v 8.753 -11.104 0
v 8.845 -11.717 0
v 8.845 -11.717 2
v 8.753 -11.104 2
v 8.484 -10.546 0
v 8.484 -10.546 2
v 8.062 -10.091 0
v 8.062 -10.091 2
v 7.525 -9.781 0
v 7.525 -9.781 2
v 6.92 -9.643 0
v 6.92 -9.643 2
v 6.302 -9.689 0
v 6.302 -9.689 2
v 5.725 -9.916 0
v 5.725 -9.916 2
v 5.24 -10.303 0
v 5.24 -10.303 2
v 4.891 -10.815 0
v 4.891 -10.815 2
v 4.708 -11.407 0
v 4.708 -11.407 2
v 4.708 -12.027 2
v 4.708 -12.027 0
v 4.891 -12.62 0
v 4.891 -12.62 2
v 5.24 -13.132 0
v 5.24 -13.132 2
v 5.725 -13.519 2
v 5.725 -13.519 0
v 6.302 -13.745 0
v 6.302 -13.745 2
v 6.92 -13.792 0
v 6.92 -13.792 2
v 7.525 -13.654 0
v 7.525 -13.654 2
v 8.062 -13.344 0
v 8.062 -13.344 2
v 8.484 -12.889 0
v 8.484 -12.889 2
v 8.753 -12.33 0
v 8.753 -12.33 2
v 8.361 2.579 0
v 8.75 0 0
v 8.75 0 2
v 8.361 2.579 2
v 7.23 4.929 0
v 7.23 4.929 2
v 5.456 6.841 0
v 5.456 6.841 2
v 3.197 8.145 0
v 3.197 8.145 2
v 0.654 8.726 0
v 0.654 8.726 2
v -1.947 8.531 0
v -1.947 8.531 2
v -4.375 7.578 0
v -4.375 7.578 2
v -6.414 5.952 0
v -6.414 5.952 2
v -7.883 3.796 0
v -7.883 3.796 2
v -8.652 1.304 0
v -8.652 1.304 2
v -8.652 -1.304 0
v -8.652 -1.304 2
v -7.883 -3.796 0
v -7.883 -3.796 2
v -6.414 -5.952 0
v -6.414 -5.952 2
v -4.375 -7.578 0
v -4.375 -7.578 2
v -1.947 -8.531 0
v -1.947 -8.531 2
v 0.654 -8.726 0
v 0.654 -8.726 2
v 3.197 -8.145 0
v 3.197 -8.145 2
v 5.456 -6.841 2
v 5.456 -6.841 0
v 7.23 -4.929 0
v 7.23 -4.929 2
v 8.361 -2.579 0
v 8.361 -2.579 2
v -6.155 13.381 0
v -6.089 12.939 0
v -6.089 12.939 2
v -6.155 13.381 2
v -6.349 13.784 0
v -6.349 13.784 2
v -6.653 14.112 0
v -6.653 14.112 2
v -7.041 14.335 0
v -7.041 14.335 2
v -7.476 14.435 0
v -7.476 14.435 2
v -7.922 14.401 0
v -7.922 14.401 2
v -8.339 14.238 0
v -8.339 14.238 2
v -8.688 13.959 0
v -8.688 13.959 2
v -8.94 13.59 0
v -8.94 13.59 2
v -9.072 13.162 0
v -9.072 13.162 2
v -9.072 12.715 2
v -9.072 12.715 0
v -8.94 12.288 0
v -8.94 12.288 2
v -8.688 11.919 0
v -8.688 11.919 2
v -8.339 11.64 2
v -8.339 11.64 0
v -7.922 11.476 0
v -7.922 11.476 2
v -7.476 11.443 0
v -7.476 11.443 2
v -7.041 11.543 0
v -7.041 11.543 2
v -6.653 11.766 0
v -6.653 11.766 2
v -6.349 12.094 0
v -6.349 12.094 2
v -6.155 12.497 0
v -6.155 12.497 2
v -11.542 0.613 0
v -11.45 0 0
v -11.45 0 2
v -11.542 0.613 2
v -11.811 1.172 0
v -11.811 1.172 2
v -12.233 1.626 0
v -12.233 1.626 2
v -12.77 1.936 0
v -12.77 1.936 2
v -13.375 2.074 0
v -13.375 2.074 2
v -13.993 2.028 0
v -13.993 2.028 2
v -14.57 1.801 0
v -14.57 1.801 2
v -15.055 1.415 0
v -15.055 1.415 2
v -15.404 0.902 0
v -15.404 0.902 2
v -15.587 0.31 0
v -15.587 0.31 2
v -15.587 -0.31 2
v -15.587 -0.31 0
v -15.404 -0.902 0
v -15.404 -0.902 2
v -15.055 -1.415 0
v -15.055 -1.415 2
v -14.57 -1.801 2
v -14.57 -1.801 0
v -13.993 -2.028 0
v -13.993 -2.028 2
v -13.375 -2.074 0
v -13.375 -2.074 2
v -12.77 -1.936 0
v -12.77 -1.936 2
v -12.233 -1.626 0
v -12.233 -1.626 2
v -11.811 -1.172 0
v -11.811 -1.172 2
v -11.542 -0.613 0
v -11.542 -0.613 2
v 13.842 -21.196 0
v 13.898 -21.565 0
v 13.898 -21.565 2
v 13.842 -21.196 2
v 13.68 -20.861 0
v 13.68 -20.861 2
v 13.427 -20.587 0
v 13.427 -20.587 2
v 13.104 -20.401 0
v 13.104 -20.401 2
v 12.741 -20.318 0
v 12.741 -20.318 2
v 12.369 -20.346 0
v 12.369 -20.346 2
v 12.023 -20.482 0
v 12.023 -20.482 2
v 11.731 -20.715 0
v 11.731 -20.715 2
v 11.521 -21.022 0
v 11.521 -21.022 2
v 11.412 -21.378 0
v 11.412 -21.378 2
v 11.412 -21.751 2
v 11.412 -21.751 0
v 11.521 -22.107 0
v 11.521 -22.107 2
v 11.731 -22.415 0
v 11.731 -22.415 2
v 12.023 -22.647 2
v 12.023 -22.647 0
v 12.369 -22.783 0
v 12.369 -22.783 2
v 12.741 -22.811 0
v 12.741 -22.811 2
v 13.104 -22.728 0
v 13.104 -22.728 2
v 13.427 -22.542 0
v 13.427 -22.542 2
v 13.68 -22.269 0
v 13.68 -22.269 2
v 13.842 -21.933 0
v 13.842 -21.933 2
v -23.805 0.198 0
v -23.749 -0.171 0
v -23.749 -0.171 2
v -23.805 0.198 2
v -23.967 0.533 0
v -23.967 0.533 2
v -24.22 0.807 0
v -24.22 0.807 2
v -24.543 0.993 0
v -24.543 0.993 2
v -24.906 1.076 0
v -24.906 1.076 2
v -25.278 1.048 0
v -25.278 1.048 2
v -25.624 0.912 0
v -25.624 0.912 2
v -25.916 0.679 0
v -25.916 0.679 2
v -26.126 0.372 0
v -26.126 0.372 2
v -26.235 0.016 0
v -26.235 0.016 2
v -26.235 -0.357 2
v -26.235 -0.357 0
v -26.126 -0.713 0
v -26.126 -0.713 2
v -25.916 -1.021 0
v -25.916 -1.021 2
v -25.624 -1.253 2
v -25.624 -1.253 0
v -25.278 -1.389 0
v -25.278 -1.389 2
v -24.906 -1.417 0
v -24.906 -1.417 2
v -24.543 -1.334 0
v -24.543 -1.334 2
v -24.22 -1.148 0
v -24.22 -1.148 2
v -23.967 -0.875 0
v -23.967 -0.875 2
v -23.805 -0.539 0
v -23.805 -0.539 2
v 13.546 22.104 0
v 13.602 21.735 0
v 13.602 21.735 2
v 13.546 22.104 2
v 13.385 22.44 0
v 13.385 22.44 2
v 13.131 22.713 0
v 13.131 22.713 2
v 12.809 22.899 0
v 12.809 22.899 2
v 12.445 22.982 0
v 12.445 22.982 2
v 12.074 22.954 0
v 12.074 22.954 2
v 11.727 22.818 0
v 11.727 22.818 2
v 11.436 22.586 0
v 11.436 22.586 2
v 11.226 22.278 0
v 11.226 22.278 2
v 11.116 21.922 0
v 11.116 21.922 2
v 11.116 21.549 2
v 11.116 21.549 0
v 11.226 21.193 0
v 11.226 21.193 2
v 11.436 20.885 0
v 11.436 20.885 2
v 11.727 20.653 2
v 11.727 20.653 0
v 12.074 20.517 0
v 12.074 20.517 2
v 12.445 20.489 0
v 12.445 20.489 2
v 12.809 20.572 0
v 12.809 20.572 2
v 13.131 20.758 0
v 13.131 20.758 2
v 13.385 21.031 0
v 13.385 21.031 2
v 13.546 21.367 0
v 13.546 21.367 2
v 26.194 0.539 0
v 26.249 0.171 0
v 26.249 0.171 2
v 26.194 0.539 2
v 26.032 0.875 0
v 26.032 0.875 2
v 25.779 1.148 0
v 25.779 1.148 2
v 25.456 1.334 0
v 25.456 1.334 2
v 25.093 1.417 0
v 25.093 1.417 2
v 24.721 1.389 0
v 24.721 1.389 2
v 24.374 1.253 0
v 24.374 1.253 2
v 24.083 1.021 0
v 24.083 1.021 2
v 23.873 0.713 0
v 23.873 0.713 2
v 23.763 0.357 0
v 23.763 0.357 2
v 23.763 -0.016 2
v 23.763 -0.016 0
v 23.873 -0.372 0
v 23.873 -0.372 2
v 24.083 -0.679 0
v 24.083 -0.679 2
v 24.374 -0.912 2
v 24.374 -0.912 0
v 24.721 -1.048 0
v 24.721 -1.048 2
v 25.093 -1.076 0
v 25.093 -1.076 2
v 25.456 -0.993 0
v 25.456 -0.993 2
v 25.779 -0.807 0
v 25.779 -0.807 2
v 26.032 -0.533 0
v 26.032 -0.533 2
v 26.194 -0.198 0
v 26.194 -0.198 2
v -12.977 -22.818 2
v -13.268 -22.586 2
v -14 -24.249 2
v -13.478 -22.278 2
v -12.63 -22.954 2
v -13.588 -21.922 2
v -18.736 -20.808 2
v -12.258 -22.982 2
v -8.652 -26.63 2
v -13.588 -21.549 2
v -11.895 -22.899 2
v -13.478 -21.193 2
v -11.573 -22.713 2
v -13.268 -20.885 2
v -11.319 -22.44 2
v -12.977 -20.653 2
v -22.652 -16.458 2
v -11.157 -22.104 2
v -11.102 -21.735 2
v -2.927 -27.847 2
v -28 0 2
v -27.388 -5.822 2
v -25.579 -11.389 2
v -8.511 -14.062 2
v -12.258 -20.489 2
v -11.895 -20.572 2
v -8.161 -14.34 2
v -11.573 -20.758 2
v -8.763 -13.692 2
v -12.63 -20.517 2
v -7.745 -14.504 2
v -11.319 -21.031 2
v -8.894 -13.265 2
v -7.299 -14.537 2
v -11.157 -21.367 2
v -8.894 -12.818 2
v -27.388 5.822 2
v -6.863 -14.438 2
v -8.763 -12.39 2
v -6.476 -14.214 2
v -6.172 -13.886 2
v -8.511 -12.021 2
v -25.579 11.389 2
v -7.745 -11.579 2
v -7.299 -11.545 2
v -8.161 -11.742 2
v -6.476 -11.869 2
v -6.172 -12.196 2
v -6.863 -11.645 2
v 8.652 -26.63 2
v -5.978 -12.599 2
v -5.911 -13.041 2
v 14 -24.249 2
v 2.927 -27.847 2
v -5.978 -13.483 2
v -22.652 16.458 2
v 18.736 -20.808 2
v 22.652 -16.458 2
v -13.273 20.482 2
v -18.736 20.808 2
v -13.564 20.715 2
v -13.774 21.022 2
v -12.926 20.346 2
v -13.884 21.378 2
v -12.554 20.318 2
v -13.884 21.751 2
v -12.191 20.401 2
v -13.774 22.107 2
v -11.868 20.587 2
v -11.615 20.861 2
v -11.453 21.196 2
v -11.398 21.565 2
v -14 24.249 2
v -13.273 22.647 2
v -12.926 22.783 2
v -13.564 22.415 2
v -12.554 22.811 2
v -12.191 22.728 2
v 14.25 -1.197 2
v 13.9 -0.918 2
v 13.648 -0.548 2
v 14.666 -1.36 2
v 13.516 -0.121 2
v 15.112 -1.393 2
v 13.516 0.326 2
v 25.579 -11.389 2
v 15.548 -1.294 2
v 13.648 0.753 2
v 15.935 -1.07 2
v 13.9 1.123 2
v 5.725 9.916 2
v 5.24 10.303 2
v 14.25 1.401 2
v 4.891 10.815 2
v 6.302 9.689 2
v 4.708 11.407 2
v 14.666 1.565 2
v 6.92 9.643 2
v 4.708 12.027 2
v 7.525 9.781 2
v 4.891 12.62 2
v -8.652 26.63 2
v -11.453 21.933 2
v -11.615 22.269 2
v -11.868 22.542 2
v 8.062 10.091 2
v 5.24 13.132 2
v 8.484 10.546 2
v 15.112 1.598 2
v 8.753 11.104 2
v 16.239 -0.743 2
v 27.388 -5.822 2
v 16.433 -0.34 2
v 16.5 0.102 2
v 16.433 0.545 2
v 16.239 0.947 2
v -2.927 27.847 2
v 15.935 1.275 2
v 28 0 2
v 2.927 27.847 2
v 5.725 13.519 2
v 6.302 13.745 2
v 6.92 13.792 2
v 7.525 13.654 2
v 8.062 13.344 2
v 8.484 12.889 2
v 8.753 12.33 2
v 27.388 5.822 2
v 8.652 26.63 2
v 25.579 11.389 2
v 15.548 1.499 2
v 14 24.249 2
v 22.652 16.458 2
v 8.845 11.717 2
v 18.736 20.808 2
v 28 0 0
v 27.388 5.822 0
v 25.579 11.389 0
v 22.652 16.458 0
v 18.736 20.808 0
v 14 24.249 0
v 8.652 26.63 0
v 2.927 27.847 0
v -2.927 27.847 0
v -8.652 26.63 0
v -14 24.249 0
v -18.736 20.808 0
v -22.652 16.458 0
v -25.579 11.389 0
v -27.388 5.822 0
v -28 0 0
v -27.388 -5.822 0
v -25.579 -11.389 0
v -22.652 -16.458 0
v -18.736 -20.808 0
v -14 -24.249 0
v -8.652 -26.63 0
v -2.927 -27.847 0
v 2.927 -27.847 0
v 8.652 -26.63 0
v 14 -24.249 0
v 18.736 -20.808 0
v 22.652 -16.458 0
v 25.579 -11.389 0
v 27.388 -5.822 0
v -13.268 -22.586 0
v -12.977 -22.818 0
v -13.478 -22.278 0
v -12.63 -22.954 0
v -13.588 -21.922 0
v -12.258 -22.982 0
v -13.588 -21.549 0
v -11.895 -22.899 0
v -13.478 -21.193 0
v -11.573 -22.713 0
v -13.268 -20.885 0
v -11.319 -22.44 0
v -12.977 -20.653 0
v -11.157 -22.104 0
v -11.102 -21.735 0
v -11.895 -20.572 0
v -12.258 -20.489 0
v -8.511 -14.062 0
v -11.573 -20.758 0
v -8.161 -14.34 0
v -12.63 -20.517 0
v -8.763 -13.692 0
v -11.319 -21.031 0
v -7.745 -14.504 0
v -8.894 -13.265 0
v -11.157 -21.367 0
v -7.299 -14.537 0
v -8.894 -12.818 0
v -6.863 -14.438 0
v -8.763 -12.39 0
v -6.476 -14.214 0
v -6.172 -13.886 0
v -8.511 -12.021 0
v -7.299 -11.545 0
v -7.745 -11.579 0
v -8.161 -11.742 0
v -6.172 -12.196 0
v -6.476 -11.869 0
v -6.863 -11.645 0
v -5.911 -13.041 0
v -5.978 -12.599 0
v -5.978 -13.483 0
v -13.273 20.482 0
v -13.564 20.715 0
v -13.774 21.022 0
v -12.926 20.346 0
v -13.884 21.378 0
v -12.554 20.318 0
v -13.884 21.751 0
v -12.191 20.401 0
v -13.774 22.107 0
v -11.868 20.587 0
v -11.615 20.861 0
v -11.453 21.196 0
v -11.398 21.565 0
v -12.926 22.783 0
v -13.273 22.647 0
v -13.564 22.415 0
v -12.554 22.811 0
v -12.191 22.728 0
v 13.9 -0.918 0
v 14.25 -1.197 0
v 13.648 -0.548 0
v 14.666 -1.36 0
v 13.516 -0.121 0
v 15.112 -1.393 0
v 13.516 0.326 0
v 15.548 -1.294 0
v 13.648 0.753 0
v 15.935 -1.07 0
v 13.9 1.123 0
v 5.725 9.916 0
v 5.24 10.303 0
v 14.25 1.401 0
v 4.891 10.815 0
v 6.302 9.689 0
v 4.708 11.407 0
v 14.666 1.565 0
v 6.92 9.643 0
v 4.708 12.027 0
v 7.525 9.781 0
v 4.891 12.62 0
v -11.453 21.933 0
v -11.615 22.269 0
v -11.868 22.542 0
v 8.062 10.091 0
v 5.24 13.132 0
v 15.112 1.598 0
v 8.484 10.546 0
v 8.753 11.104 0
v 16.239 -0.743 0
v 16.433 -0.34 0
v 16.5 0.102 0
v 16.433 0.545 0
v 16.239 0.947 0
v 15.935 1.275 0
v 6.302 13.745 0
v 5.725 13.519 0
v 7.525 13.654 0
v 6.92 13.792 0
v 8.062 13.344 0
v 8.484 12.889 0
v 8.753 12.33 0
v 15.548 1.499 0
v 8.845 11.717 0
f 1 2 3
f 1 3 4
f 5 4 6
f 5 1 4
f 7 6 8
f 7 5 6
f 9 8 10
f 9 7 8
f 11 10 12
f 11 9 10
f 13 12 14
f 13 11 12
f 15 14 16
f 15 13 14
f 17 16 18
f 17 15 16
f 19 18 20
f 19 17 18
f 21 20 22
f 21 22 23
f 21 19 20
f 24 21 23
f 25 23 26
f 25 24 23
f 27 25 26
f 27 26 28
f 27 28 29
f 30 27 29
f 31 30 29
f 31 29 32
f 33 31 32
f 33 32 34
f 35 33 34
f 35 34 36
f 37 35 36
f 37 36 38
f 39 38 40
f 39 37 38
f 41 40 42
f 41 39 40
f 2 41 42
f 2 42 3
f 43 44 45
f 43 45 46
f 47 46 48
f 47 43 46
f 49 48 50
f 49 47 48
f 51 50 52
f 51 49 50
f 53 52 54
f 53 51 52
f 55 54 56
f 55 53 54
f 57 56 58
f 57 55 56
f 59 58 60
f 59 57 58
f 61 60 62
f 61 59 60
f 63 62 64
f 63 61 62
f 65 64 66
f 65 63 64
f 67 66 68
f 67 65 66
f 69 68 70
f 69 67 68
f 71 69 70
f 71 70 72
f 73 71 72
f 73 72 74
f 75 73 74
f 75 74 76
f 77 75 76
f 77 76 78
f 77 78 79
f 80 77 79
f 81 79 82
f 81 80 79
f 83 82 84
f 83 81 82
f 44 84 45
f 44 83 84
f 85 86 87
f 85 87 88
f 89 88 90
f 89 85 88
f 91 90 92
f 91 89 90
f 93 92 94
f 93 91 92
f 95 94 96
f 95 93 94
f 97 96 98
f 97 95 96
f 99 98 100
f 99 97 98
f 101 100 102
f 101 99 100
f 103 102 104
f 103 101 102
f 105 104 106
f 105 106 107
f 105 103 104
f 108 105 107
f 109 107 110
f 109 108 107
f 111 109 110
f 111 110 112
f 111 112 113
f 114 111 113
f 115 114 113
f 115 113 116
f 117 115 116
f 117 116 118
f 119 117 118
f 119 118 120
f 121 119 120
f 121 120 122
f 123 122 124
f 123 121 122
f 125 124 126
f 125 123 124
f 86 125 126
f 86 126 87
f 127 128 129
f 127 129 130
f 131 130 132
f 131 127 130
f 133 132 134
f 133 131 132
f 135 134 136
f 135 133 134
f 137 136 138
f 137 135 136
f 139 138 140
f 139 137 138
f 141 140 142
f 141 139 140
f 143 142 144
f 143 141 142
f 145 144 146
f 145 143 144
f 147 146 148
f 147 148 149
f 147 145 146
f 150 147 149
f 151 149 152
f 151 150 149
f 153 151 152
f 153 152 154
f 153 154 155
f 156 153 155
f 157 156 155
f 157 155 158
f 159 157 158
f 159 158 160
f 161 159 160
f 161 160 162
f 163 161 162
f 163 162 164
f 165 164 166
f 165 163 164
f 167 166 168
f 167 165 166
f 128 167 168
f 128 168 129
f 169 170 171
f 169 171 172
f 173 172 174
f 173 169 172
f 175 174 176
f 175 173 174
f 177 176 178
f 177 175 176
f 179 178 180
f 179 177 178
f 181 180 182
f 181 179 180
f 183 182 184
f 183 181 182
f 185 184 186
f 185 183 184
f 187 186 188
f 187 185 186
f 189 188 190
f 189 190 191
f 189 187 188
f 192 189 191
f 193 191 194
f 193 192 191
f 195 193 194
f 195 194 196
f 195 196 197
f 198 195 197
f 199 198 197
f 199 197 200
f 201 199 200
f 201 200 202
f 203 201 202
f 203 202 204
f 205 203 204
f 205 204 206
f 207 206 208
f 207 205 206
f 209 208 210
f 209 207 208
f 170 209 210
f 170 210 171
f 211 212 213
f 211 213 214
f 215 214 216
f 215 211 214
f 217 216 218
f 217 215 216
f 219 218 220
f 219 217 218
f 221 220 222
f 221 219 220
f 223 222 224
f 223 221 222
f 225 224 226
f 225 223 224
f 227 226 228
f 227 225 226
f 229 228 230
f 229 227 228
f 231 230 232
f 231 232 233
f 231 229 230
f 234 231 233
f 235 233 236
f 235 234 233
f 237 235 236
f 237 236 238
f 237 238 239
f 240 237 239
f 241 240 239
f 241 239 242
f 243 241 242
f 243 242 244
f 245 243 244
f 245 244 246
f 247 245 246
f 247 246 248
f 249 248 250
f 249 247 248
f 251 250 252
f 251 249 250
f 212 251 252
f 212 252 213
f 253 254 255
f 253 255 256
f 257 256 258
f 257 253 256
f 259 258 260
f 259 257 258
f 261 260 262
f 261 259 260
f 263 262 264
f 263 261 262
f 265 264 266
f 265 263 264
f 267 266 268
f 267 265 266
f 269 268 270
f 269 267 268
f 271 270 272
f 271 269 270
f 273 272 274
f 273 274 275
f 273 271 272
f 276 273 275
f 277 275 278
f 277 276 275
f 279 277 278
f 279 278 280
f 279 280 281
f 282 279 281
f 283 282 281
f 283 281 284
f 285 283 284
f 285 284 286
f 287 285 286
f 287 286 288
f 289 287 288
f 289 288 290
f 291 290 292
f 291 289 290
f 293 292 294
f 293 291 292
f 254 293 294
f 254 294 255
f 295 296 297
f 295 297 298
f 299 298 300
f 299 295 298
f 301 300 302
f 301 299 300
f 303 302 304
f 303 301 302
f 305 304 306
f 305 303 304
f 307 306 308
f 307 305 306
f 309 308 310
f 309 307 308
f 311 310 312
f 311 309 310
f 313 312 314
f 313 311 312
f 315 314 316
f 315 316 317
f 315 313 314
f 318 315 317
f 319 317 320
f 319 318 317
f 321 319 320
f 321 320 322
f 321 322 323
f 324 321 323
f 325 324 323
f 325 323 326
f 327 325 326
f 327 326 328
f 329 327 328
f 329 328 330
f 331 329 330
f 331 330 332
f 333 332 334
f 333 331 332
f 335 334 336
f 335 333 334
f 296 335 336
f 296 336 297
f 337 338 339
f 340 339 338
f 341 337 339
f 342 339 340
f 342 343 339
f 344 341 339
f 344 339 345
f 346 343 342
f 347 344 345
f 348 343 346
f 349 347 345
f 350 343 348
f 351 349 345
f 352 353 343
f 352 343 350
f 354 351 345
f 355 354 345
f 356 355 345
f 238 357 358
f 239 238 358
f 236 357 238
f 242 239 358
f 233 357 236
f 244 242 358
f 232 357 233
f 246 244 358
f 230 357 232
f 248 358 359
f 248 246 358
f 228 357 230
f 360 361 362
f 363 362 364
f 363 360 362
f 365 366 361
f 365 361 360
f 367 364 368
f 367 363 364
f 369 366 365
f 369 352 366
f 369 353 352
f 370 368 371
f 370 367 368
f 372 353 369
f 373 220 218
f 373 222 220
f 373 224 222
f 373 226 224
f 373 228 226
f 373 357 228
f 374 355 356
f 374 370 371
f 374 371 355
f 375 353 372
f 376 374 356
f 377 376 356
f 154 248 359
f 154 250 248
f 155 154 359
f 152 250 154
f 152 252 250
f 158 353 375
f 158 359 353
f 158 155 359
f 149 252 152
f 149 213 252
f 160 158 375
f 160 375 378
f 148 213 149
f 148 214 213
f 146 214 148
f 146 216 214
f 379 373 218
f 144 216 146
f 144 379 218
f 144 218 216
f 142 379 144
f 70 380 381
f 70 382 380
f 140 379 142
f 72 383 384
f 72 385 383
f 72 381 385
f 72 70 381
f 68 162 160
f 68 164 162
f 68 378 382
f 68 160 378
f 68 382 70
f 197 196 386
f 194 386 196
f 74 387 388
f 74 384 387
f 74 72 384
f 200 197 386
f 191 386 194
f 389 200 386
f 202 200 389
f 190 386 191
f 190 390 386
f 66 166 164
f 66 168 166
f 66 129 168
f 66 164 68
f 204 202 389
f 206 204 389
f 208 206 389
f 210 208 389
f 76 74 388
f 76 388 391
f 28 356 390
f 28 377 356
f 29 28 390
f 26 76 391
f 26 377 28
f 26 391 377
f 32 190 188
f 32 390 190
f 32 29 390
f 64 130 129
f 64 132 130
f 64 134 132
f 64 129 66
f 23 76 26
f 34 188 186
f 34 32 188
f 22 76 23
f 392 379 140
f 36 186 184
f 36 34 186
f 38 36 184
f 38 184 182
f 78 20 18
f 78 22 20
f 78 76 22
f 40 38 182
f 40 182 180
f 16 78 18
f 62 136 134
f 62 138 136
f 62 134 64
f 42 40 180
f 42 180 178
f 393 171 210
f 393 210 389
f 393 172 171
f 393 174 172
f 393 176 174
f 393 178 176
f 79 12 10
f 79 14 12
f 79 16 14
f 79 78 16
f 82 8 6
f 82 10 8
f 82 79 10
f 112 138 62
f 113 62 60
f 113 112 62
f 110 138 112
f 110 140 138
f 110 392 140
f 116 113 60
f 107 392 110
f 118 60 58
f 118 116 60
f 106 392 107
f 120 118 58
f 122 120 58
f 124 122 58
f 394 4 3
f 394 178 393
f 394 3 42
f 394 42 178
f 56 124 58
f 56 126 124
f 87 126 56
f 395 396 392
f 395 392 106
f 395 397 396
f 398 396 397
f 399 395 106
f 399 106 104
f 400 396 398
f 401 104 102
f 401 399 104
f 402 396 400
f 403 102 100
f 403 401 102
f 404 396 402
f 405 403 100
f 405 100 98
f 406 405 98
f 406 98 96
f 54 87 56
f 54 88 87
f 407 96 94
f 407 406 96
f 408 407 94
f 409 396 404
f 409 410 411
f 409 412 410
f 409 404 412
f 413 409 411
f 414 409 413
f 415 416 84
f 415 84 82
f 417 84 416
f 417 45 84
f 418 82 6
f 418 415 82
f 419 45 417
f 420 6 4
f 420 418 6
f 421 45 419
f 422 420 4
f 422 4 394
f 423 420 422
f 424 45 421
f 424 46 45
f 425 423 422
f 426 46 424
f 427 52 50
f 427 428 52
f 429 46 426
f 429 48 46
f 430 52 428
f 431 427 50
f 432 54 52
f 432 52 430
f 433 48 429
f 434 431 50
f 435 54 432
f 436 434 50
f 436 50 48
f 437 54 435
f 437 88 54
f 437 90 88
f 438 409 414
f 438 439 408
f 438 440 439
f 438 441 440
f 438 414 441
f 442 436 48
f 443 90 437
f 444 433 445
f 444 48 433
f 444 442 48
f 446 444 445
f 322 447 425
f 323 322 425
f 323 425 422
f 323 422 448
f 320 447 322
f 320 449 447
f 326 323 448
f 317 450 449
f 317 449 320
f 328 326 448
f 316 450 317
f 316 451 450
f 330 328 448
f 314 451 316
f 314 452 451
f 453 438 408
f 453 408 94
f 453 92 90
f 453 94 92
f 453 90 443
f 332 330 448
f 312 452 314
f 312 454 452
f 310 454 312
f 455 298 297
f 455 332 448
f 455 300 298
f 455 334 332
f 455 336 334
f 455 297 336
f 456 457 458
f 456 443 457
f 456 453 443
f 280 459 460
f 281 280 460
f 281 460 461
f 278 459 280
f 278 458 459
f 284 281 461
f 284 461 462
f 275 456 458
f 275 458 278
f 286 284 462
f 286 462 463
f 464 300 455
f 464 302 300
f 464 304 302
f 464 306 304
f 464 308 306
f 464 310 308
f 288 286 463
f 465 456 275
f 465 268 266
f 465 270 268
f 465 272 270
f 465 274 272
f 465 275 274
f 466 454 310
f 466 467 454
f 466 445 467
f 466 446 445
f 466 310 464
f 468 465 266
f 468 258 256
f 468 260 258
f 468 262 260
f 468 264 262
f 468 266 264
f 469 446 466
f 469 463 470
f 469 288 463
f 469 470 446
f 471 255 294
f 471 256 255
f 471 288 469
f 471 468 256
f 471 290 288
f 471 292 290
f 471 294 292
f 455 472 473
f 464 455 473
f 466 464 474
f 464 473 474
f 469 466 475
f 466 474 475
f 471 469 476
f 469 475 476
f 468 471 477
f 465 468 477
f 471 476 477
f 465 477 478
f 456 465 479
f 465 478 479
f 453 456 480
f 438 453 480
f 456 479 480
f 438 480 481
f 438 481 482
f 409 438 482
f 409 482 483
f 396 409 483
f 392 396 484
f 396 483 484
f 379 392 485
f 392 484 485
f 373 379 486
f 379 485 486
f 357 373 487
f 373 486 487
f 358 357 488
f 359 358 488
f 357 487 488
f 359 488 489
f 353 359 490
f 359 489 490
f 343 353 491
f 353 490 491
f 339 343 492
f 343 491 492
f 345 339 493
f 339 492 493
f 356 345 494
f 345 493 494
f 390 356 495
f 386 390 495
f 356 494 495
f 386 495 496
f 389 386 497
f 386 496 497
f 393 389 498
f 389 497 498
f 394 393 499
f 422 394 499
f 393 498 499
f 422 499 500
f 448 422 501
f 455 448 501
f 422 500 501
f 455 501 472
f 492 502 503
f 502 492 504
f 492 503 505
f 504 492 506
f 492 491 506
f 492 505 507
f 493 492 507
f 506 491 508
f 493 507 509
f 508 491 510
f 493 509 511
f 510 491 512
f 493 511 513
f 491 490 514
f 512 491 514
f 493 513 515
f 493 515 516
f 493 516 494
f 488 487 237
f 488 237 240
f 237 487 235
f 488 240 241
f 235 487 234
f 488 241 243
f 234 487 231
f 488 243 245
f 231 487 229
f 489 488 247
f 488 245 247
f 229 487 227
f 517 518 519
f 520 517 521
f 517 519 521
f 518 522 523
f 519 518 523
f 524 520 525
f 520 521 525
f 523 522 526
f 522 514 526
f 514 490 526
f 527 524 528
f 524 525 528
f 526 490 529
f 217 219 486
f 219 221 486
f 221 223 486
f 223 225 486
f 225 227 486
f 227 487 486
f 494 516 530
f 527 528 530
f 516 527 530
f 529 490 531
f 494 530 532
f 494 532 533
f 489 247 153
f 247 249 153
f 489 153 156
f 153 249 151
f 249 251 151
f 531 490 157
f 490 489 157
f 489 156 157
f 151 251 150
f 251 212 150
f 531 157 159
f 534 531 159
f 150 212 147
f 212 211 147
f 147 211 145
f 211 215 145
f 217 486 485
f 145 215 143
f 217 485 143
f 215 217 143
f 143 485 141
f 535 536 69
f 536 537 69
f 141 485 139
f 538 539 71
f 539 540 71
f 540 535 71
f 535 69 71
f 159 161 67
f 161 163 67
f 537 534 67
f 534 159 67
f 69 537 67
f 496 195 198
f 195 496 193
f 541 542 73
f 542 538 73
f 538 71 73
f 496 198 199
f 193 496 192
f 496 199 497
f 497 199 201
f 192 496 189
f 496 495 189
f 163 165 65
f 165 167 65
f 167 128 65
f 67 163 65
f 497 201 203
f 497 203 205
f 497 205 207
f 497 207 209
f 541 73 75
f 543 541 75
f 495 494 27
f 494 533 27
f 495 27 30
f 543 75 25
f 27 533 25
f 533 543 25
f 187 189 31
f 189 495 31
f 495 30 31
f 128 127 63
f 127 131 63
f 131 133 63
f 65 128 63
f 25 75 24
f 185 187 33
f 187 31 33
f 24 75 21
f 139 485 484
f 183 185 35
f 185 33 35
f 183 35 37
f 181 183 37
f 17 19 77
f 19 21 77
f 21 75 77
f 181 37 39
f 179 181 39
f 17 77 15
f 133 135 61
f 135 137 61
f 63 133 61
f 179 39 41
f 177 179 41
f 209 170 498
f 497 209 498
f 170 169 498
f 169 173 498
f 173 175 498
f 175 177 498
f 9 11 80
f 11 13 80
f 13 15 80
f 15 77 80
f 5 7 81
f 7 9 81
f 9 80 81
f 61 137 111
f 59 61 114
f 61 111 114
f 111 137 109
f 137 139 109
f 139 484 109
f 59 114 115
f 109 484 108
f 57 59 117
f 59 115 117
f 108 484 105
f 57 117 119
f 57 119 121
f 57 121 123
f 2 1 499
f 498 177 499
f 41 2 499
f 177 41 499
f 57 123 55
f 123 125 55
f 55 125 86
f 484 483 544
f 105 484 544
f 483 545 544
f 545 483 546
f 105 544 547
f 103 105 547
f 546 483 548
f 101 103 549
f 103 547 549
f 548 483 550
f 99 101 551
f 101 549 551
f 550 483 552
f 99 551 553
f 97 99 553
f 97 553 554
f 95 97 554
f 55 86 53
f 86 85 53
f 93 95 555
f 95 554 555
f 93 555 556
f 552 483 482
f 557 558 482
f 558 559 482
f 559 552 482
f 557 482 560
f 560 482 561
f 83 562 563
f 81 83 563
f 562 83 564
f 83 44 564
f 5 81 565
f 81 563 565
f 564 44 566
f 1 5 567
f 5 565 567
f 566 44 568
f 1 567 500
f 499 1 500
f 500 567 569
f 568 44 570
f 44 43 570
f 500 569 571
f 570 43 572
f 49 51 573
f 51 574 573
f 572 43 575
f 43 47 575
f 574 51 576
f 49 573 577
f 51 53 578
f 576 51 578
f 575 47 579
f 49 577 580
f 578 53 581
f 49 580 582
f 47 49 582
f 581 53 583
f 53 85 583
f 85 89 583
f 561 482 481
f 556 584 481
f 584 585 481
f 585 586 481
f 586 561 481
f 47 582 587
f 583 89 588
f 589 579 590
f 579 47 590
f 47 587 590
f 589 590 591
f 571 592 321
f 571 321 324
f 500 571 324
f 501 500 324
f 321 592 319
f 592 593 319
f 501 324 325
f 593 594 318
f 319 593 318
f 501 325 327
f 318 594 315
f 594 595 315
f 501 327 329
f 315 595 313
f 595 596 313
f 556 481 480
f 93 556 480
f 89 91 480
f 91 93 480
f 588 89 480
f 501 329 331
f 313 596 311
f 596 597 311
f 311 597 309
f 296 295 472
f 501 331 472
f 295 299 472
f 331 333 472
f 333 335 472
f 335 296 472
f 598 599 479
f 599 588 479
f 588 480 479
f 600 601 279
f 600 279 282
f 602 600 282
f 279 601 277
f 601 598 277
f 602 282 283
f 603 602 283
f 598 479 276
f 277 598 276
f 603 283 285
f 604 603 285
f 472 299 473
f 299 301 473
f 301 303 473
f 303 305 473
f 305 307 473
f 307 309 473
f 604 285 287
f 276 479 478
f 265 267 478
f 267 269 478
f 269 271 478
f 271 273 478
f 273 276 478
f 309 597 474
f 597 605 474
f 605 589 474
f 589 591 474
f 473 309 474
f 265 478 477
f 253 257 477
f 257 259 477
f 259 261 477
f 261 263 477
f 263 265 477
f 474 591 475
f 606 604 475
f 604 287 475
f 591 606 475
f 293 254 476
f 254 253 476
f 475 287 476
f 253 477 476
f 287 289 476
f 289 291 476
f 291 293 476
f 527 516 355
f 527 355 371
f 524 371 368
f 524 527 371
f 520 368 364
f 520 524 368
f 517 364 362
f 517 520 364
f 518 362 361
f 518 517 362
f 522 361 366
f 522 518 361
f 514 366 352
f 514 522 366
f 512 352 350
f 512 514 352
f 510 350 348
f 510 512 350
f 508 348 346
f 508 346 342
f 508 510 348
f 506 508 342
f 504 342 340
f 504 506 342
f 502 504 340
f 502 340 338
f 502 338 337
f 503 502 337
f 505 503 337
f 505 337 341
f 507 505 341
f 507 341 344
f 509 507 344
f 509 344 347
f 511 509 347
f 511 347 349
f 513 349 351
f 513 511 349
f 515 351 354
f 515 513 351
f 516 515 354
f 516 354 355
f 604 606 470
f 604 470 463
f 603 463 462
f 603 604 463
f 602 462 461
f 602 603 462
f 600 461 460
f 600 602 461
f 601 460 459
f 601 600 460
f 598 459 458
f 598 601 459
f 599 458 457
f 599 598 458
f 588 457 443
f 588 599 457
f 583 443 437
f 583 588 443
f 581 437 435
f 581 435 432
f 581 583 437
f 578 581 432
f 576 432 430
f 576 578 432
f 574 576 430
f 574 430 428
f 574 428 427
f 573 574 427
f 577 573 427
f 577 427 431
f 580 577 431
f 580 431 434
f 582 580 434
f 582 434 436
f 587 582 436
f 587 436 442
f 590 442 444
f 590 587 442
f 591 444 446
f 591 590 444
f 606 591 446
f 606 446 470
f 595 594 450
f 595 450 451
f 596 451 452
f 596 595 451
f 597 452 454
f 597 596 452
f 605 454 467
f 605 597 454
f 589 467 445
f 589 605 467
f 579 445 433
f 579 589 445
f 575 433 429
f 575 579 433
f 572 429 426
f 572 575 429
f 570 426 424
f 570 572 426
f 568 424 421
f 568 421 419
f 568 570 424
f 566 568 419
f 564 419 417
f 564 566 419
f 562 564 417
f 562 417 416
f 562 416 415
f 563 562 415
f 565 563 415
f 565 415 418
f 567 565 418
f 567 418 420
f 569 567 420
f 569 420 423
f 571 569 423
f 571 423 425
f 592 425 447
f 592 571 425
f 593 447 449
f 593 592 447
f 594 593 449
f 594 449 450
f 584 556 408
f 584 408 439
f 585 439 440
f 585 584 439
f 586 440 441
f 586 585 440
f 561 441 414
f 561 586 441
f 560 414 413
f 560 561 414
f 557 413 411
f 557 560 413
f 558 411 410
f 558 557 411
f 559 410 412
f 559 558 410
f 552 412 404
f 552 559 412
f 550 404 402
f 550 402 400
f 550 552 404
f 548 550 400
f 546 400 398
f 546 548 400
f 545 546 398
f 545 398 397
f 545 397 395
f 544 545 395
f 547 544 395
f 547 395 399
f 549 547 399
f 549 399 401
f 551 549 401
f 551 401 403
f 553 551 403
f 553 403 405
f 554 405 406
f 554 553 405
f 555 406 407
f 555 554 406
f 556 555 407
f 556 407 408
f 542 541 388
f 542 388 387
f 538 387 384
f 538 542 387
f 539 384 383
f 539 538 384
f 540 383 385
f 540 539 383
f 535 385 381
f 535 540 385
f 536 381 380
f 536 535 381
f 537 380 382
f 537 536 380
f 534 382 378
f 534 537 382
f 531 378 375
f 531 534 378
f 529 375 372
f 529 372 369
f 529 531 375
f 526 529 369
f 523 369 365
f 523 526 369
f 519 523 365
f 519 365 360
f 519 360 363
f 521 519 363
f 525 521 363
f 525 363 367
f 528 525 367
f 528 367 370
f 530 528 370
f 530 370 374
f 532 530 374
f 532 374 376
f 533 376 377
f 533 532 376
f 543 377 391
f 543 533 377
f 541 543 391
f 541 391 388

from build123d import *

# Parameters (mm, degrees)
SKETCH_1_R      = 28
SKETCH_1_R_2    = 2.08
SKETCH_1_R_3    = 8.75
SKETCH_1_R_4    = 1.25
SKETCH_1_R_5    = 1.5
EXTRUDE_1_DEPTH = 2


with BuildPart() as part:
    # 草图1 → 凸台-拉伸1 (new body)
    with BuildSketch(Plane.XY):
        Circle(SKETCH_1_R)
        with Locations((-13.53, 0)):
            Circle(SKETCH_1_R_2, mode=Mode.SUBTRACT)
        with Locations((6.765, 11.717323713)):
            Circle(SKETCH_1_R_2, mode=Mode.SUBTRACT)
        with Locations((6.765, -11.717323713)):
            Circle(SKETCH_1_R_2, mode=Mode.SUBTRACT)
        Circle(SKETCH_1_R_3, mode=Mode.SUBTRACT)
        with Locations((12.351862398, 21.735489304)):
            Circle(SKETCH_1_R_4, mode=Mode.SUBTRACT)
        with Locations((24.9994171, 0.170718032)):
            Circle(SKETCH_1_R_4, mode=Mode.SUBTRACT)
        with Locations((12.647554702, -21.564771273)):
            Circle(SKETCH_1_R_4, mode=Mode.SUBTRACT)
        with Locations((-12.351862398, -21.735489304)):
            Circle(SKETCH_1_R_4, mode=Mode.SUBTRACT)
        with Locations((-24.9994171, -0.170718032)):
            Circle(SKETCH_1_R_4, mode=Mode.SUBTRACT)
        with Locations((-12.647554702, 21.564771273)):
            Circle(SKETCH_1_R_4, mode=Mode.SUBTRACT)
        with Locations((-7.411117439, -13.041293583)):
            Circle(SKETCH_1_R_5, mode=Mode.SUBTRACT)
        with Locations((-7.588532821, 12.938862764)):
            Circle(SKETCH_1_R_5, mode=Mode.SUBTRACT)
        with Locations((14.99965026, 0.102430819)):
            Circle(SKETCH_1_R_5, mode=Mode.SUBTRACT)
    extrude(amount=EXTRUDE_1_DEPTH)


solid = part.part
